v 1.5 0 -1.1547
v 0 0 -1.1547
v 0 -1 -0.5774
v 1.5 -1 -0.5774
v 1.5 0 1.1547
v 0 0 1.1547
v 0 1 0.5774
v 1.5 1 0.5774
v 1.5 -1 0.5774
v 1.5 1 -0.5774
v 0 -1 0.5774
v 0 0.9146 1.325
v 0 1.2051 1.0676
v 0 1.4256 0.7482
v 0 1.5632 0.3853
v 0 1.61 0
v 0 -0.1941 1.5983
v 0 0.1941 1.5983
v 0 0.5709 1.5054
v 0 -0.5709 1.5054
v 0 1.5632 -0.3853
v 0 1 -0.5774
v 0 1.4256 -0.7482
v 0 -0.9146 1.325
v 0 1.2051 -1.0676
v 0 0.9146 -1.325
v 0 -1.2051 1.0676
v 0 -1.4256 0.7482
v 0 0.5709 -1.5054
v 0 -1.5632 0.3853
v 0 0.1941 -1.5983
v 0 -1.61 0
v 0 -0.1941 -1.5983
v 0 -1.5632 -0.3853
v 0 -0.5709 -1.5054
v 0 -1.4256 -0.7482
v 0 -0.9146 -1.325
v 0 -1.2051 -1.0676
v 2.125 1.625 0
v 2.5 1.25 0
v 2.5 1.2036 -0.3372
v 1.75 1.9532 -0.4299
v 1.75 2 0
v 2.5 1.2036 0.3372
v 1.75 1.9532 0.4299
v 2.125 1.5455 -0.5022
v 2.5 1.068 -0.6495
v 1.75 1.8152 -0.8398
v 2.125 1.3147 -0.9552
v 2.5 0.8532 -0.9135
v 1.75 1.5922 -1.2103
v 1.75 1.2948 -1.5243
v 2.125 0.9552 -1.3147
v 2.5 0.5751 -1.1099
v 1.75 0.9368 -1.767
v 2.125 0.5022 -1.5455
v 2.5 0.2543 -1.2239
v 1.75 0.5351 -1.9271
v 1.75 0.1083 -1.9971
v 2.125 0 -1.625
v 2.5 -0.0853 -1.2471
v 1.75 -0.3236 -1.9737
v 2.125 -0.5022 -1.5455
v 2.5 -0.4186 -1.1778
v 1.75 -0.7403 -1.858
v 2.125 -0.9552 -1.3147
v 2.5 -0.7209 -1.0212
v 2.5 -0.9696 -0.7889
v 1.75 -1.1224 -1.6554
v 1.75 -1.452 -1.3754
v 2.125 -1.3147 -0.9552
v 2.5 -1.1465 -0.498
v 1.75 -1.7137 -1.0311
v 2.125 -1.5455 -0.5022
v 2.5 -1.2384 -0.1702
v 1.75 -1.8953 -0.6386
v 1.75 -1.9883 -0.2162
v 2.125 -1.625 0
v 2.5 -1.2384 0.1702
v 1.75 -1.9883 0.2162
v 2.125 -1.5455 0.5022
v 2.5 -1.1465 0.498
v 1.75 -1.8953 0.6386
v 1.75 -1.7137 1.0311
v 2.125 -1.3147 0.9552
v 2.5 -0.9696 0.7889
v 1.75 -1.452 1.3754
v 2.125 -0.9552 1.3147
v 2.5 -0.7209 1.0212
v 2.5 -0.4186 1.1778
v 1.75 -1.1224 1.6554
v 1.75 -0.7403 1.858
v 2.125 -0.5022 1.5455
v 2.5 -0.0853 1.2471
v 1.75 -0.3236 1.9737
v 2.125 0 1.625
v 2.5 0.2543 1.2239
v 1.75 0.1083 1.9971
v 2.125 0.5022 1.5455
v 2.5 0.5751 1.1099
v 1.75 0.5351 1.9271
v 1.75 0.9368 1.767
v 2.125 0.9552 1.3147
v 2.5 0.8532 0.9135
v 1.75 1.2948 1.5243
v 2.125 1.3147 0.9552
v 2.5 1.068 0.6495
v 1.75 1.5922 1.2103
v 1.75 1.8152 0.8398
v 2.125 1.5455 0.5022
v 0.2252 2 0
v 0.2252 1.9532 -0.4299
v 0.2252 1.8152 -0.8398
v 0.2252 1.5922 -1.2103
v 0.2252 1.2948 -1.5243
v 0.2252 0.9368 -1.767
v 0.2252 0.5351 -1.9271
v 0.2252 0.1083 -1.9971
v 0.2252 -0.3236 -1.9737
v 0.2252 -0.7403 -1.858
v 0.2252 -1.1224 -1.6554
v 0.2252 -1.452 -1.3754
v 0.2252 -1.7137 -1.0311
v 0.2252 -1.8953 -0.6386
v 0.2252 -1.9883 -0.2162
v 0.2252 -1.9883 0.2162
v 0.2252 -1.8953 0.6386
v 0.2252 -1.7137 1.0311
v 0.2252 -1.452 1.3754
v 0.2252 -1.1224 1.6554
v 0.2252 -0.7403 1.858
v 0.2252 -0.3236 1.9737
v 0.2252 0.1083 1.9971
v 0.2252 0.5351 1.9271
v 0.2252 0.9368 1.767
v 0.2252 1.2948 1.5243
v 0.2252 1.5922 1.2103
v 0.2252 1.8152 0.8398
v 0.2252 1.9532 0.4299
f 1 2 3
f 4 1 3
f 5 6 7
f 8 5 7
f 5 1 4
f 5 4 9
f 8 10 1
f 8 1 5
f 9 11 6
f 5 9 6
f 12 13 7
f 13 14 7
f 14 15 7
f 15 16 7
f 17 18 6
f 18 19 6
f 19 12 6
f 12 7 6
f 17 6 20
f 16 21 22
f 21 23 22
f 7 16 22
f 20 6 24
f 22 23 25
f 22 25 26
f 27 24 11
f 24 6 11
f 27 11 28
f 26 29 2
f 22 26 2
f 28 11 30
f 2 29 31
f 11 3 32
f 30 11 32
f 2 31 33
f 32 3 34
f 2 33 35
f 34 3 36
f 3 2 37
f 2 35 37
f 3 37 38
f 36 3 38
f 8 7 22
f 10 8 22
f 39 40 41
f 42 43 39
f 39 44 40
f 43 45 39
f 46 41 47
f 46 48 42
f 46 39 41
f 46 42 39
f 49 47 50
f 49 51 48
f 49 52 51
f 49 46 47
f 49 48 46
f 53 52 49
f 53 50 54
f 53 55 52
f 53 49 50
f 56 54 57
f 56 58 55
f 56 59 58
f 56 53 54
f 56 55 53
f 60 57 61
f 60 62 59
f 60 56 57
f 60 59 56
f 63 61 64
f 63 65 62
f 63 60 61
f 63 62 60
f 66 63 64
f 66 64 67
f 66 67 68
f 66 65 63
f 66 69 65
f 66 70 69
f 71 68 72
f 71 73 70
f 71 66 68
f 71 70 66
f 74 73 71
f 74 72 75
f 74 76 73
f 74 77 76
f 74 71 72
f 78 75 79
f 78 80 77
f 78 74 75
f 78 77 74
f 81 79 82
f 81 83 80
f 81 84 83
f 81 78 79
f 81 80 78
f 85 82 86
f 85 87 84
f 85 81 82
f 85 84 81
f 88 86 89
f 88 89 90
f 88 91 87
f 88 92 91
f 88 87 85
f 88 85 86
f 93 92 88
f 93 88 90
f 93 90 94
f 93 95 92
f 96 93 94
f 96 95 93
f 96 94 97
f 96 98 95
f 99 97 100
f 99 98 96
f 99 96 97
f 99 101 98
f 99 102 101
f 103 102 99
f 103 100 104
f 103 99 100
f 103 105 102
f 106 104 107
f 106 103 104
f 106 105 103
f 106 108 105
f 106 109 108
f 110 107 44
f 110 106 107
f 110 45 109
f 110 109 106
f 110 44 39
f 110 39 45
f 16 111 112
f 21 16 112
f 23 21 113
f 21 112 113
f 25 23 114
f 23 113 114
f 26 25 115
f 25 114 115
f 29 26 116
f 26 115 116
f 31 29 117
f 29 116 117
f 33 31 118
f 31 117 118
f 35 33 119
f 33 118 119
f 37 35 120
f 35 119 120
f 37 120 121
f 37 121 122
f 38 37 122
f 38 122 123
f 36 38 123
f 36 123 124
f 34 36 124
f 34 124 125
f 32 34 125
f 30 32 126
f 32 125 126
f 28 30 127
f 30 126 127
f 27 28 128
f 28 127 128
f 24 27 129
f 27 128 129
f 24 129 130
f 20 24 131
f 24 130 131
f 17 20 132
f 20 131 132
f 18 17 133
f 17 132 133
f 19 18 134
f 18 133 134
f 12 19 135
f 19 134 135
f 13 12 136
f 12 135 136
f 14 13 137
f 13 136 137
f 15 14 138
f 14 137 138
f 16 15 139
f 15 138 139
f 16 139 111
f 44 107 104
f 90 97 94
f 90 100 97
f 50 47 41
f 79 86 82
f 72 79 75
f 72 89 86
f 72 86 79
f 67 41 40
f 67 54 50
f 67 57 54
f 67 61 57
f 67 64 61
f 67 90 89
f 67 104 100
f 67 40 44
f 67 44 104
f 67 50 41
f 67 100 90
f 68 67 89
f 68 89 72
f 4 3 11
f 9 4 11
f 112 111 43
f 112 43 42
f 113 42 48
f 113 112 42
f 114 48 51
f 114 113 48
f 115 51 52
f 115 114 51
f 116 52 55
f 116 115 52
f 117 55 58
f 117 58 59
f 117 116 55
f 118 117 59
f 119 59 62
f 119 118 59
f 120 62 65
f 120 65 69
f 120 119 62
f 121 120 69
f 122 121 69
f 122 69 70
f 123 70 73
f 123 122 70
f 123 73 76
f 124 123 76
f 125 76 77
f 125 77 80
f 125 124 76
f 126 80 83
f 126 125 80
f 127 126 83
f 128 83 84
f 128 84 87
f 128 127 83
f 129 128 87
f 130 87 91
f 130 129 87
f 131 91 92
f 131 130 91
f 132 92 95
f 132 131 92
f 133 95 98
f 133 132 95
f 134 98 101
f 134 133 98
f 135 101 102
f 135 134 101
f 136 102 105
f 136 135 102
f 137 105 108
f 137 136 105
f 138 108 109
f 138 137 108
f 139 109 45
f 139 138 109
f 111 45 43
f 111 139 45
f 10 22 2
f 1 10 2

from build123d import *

# Parameters (mm, degrees)
SKETCH_1_W          = 2.5
SKETCH_1_H          = 2
CUT_EXTRUDE_1_DEPTH = 1.5
CHAMFER_1_SIZE      = 0.75
CHAMFER_2_SIZE      = 0.39
CHAMFER_2_SIZE2     = 0.225166605


with BuildPart() as part:
    # Эскиз1 → Повернуть1 (revolve)
    with BuildSketch(Plane(origin=(0, 0, 0), x_dir=(-1, 0, 0), z_dir=(0, 0, -1))):
        with Locations((-1.25, 1)):
            Rectangle(SKETCH_1_W, SKETCH_1_H)
    revolve(axis=Axis((2.5, 0, 0), (-1, 0, 0)))

    # Эскиз2 → Вырез-Вытянуть1 (cut)
    with BuildSketch(Plane.ZY):
        Polygon((1.154700538, 0), (0.577350269, 1), (-0.577350269, 1), (-1.154700538, 0), (-0.577350269, -1), (0.577350269, -1), align=None)
    extrude(amount=-CUT_EXTRUDE_1_DEPTH, mode=Mode.SUBTRACT)

    # Фаска1
    chamfer_1_edges = [part.edges().sort_by_distance(p)[0] for p in [
        (2.5, -2, 0),
    ]]
    chamfer(chamfer_1_edges, length=CHAMFER_1_SIZE)

    # Фаска2
    chamfer_2_edges = [part.edges().sort_by_distance(p)[0] for p in [
        (0, -2, 0),
    ]]
    chamfer_2_side = [part.faces().sort_by_distance(p)[0] for p in [
        (0, -1.943431458, 0),
    ]]
    chamfer(chamfer_2_edges, length=CHAMFER_2_SIZE, length2=CHAMFER_2_SIZE2, reference=chamfer_2_side[0])


solid = part.part
